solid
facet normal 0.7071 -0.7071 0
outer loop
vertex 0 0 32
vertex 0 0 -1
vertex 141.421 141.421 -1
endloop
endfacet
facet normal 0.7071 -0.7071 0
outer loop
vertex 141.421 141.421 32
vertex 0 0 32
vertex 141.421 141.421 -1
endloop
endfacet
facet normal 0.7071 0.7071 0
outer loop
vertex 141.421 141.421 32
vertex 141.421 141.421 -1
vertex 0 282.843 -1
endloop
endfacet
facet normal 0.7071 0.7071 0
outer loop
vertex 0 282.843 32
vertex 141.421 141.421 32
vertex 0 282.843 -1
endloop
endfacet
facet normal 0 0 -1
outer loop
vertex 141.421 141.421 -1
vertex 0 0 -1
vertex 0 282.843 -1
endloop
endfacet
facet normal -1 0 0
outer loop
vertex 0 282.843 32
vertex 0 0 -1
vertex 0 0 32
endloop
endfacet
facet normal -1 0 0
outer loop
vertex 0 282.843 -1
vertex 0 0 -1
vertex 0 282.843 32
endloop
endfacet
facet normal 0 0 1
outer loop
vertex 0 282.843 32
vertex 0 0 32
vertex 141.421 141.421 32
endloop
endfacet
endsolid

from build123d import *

# Parameters (mm, degrees)
BOX_W                  = 313
BOX_H                  = 200
BOX_DEPTH              = 37
BOX_PLACEMENT_ANGLE    = 45
BOX008_W               = 200
BOX008_H               = 200
BOX008_DEPTH           = 33
CUT007_PLACEMENT_ANGLE = 45


with BuildPart() as cube002:
    # Box → Box (new body)
    with BuildSketch(Plane.XY):
        with Locations((156.5, 100)):
            Rectangle(BOX_W, BOX_H)
    extrude(amount=BOX_DEPTH)


with BuildPart() as cube002_1:
    # Box placement: moved
    add(cube002.part.moved(Location((0, 0, -2))).rotate(Axis((0, 0, -2), (0, 0, 1)), BOX_PLACEMENT_ANGLE))


with BuildPart() as short_45a:
    # Box008 → Box008 (new body)
    with BuildSketch(Plane.XY.offset(-1)):
        with Locations((100, 100)):
            Rectangle(BOX008_W, BOX008_H)
    extrude(amount=BOX008_DEPTH)

    # Cut007: cut Cube002
    add(cube002_1.part, mode=Mode.SUBTRACT)


with BuildPart() as short_45a_1:
    # Cut007 placement: moved
    add(short_45a.part.rotate(Axis((0, 0, 0), (0, 0, 1)), CUT007_PLACEMENT_ANGLE))


solid = short_45a_1.part
